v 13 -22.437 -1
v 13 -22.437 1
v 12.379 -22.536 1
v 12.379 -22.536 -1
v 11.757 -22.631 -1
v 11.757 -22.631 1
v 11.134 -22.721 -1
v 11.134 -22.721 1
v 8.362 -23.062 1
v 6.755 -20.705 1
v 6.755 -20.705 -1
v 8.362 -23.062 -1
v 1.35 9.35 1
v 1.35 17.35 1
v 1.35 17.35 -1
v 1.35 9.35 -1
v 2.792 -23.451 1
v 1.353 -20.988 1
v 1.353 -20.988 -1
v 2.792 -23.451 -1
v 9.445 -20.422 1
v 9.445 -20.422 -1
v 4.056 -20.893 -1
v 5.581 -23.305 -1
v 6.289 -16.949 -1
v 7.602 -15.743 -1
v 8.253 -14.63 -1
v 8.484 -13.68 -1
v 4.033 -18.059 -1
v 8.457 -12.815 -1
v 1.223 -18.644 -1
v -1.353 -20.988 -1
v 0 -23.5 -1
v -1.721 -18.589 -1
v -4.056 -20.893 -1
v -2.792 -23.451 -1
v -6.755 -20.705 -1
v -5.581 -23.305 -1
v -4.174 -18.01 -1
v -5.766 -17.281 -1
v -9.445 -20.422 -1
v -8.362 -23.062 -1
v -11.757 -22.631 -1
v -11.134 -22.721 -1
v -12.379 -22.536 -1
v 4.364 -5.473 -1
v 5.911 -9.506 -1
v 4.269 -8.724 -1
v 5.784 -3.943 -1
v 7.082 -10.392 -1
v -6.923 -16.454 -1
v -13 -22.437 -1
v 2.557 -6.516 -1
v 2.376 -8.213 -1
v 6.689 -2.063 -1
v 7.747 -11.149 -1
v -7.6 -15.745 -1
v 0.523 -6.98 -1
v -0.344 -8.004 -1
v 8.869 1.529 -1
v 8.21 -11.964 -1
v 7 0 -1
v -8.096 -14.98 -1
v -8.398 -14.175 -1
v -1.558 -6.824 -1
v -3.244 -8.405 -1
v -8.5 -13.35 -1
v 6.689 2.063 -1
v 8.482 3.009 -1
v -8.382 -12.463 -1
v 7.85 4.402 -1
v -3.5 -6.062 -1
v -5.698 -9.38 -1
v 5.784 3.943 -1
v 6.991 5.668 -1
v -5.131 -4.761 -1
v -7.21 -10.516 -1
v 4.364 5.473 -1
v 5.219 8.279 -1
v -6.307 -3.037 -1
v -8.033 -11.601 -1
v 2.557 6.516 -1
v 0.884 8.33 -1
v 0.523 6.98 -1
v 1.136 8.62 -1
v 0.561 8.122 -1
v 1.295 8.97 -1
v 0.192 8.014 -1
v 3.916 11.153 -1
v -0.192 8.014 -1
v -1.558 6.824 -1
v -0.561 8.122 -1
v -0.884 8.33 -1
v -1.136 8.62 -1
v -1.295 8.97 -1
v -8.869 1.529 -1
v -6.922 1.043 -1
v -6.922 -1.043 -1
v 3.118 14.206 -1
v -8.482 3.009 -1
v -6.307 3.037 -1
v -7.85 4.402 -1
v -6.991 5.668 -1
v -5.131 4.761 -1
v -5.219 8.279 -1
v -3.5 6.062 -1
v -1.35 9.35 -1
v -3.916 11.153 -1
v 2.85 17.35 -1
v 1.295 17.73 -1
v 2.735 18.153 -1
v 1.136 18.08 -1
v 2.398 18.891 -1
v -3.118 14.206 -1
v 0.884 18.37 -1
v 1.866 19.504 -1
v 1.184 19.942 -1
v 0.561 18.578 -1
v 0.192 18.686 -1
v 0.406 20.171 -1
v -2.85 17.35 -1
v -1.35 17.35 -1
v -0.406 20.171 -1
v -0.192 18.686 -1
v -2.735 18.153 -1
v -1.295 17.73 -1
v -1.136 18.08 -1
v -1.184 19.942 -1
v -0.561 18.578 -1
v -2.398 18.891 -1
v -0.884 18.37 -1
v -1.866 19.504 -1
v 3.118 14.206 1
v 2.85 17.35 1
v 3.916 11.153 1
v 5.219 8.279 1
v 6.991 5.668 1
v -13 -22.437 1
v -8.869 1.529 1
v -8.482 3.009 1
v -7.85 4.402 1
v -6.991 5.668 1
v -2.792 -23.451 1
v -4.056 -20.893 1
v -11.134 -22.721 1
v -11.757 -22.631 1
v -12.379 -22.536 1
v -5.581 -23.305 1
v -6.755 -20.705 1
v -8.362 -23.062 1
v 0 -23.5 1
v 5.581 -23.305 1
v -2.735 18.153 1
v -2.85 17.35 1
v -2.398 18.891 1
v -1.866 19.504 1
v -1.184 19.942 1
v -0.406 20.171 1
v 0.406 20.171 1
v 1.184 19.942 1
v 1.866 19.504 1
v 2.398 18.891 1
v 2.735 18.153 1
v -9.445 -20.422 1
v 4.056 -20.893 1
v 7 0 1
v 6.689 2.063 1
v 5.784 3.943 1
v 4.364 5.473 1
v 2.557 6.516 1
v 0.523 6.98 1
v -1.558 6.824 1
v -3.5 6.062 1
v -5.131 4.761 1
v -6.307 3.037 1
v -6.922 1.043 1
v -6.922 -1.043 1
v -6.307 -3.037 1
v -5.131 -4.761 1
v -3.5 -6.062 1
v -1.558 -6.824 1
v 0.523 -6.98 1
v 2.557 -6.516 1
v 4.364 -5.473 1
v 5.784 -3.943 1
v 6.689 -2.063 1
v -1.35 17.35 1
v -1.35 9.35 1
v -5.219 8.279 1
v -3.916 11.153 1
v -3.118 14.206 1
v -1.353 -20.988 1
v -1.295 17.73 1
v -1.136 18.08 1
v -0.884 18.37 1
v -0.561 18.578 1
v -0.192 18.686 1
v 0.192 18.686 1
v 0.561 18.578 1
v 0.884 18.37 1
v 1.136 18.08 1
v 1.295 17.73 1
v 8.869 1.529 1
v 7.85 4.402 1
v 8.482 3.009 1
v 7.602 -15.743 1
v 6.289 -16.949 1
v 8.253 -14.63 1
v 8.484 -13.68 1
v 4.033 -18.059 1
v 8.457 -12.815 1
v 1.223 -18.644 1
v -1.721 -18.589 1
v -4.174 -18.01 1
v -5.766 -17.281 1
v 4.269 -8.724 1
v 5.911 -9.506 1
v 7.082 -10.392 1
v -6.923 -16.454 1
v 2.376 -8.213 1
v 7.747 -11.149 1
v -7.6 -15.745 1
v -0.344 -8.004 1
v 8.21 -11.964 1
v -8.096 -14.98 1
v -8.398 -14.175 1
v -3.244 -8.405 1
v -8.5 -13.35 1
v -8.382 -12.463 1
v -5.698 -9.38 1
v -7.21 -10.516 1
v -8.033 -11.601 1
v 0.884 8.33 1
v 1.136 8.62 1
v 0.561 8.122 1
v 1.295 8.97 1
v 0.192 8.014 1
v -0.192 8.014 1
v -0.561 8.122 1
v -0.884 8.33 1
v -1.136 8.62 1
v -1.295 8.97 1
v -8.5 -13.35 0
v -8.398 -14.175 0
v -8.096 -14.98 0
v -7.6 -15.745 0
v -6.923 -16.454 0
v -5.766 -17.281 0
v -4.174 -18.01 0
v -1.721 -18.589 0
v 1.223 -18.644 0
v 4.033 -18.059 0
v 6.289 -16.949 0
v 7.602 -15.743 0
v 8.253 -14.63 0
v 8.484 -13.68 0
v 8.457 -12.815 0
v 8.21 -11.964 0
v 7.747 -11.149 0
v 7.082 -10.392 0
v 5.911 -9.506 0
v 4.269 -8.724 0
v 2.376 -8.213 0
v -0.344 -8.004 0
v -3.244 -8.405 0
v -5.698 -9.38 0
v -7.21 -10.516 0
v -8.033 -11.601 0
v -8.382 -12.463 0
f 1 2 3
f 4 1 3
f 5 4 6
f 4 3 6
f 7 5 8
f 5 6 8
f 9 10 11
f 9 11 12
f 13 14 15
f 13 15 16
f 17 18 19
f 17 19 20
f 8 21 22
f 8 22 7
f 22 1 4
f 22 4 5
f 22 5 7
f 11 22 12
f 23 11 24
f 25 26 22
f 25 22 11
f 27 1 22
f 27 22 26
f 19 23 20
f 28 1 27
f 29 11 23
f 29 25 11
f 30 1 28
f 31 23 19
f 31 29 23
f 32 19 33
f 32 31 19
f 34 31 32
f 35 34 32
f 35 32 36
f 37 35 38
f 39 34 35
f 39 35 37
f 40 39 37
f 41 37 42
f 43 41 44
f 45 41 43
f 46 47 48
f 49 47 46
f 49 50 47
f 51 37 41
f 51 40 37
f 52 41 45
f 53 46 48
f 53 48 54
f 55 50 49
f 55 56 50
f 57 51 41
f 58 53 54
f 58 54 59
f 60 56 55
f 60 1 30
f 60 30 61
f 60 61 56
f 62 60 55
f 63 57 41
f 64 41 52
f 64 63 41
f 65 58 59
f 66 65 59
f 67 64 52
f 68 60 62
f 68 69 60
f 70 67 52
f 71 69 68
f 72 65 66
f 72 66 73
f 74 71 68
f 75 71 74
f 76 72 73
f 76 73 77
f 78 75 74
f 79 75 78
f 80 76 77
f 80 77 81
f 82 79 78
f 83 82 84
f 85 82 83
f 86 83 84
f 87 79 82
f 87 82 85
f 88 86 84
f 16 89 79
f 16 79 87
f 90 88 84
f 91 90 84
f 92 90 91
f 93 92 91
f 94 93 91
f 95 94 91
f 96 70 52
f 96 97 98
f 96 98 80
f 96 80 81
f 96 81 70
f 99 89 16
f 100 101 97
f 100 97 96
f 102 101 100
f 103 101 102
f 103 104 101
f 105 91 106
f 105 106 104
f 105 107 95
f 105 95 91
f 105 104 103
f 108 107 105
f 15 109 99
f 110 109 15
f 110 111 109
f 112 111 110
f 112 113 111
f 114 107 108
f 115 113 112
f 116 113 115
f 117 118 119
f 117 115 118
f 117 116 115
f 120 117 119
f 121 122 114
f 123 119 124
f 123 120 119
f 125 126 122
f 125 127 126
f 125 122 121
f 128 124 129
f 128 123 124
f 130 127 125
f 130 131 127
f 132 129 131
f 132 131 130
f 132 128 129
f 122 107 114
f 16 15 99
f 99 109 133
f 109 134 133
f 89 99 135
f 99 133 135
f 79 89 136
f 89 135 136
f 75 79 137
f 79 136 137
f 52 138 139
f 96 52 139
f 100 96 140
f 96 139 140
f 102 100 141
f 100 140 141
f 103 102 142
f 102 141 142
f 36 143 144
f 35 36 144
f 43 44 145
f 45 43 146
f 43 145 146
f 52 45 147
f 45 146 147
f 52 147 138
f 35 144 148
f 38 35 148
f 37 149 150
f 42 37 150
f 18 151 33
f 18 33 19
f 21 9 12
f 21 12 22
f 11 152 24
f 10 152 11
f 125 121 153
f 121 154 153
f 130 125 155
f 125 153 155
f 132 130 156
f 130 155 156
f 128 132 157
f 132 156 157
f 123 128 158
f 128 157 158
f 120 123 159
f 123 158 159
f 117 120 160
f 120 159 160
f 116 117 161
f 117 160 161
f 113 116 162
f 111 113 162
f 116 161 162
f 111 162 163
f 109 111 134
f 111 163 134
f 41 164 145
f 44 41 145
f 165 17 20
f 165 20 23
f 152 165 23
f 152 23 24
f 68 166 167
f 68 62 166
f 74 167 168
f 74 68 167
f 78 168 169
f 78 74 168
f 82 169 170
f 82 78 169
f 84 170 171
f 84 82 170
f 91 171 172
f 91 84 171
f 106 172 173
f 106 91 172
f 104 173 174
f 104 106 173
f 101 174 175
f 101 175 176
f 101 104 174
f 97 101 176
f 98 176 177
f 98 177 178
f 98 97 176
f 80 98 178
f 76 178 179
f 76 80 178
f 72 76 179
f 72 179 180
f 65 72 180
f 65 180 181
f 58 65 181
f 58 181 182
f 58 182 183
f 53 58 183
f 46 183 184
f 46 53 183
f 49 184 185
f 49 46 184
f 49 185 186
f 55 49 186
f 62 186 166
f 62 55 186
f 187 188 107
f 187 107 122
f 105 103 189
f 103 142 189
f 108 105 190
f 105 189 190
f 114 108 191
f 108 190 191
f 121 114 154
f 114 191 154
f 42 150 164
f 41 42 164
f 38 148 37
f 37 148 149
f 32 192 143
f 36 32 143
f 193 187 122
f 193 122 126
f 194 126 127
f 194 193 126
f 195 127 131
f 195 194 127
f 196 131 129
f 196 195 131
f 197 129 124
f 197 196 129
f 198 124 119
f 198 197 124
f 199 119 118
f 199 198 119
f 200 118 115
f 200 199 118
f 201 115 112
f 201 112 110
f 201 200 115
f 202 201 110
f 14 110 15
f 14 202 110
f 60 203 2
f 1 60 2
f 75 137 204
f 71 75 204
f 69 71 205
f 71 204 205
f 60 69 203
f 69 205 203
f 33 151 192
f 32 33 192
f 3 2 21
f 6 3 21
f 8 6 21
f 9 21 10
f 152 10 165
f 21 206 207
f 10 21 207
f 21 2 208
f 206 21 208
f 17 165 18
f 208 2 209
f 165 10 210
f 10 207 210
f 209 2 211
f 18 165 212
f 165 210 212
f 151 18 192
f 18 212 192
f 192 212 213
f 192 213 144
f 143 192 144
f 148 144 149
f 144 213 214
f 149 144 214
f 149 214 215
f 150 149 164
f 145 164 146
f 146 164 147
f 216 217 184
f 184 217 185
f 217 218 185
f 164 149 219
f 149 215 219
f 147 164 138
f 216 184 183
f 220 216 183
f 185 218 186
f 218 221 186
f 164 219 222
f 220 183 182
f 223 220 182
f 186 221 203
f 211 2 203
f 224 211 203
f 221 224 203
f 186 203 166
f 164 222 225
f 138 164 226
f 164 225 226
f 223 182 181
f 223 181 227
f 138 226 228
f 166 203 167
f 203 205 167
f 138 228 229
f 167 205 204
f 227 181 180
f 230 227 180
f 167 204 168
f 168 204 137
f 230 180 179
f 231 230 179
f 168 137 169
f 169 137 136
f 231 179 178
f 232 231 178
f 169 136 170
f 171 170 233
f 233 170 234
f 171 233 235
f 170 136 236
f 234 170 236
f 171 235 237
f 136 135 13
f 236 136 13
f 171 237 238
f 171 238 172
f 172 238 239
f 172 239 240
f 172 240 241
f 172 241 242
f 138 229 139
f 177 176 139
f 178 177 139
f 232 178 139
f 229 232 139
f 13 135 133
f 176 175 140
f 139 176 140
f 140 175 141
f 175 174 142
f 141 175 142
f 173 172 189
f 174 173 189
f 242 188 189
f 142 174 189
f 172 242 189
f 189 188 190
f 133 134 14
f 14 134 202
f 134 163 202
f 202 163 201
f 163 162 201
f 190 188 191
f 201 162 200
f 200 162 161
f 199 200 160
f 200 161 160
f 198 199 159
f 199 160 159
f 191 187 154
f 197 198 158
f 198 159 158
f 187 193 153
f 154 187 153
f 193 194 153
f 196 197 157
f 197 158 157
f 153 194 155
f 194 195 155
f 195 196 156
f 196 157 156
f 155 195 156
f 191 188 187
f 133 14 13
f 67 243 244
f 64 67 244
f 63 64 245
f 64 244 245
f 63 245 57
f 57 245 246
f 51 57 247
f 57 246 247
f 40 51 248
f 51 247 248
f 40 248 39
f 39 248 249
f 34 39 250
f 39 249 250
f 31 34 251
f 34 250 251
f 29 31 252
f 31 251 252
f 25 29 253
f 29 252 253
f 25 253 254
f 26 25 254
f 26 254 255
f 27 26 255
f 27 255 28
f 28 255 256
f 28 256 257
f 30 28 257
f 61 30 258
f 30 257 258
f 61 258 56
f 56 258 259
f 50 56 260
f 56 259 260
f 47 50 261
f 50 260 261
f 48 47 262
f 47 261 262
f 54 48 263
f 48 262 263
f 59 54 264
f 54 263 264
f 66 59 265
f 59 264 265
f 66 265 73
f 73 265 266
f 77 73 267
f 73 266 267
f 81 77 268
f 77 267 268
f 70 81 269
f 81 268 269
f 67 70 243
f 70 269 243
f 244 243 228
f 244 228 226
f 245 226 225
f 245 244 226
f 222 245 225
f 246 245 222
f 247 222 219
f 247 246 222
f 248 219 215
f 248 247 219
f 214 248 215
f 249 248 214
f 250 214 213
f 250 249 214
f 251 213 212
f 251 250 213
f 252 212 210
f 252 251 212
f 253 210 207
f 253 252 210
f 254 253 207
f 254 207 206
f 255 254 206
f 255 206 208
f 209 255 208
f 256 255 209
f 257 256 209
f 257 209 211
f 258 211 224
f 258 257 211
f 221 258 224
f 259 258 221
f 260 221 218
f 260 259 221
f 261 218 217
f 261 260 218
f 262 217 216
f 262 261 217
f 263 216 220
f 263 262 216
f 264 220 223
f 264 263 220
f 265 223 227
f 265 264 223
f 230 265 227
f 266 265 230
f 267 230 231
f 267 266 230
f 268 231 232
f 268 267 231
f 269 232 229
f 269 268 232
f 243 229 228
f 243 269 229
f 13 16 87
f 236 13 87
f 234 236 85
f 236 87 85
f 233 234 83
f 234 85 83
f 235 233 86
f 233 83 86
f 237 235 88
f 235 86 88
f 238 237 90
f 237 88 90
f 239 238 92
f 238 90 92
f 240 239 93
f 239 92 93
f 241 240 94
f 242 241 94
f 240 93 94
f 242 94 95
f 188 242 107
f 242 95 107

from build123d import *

# Parameters (mm, degrees)
SKETCH1_R           = 7
SKETCH1_RX          = 8.5
SKETCH1_RY          = 5.35
BOSS_EXTRUDE1_DEPTH = 1
CUT_EXTRUDE1_DEPTH  = 27.930466019


with BuildPart() as part:
    # Sketch1 → Boss-Extrude1 (new, symmetric)
    with BuildSketch(Plane.XY):
        with BuildLine():
            Line((-13, -22.436683487), (-8.869214361, 1.528736933))
            ThreePointArc((-8.869214361, 1.528736933), (-8.195662334, 3.719021229), (-6.990807006, 5.668211129))
            ThreePointArc((-6.990807006, 5.668211129), (-3.915823856, 11.153015373), (-2.85, 17.35))
            ThreePointArc((-2.85, 17.35), (0, 20.2), (2.85, 17.35))
            ThreePointArc((2.85, 17.35), (3.915823856, 11.153015373), (6.990807006, 5.668211129))
            ThreePointArc((6.990807006, 5.668211129), (8.195662334, 3.719021229), (8.869214361, 1.528736933))
            Line((8.869214361, 1.528736933), (13, -22.436683487))
            ThreePointArc((13, -22.436683487), (0, -23.5), (-13, -22.436683487))
        make_face()
        Circle(SKETCH1_R, mode=Mode.SUBTRACT)
        with Locations(Location((0, -13.35), (0, 0, 180))):
            Ellipse(SKETCH1_RX, SKETCH1_RY, mode=Mode.SUBTRACT)
        with BuildLine():
            Line((-1.35, 9.35), (-1.35, 17.35))
            ThreePointArc((-1.35, 17.35), (0, 18.7), (1.35, 17.35))
            Line((1.35, 17.35), (1.35, 9.35))
            ThreePointArc((1.35, 9.35), (0, 8), (-1.35, 9.35))
        make_face(mode=Mode.SUBTRACT)
    extrude(amount=BOSS_EXTRUDE1_DEPTH, both=True)

    # Sketch2 → Cut-Extrude1 (cut, through all)
    with BuildSketch(Plane.XY.offset(1)):
        with BuildLine():
            ThreePointArc((-11.133848077, -22.721445499), (-9.749547472, -22.903692131), (-8.362277061, -23.061751629))
            Line((-8.362277061, -23.061751629), (-9.444827704, -20.421948771))
            Line((-9.444827704, -20.421948771), (-11.133848077, -22.721445499))
        make_face()
        with BuildLine():
            ThreePointArc((-8.362277061, -23.061751629), (-6.97245942, -23.195575847), (-5.5805179, -23.305124021))
            Line((-5.5805179, -23.305124021), (-6.754536872, -20.704709731))
            Line((-6.754536872, -20.704709731), (-8.362277061, -23.061751629))
        make_face()
        with BuildLine():
            ThreePointArc((-5.5805179, -23.305124021), (-4.186876499, -23.39036278), (-2.791959736, -23.451266162))
            Line((-2.791959736, -23.451266162), (-4.056016678, -20.893408645))
            Line((-4.056016678, -20.893408645), (-5.5805179, -23.305124021))
        make_face()
        with BuildLine():
            Line((-1.352554853, -20.987815613), (-2.791959736, -23.451266162))
            ThreePointArc((-2.791959736, -23.451266162), (-1.396192515, -23.487815613), (0, -23.5))
            Line((0, -23.5), (-1.352554853, -20.987815613))
        make_face()
    cut_extrude1 = extrude(amount=-CUT_EXTRUDE1_DEPTH, mode=Mode.SUBTRACT)

    # Mirror1: Cut-Extrude1 across plane
    add(cut_extrude1.mirror(Plane(origin=(0, 0, 0), x_dir=(0, 0, 1), z_dir=(1, 0, 0))), mode=Mode.SUBTRACT)


solid = part.part
